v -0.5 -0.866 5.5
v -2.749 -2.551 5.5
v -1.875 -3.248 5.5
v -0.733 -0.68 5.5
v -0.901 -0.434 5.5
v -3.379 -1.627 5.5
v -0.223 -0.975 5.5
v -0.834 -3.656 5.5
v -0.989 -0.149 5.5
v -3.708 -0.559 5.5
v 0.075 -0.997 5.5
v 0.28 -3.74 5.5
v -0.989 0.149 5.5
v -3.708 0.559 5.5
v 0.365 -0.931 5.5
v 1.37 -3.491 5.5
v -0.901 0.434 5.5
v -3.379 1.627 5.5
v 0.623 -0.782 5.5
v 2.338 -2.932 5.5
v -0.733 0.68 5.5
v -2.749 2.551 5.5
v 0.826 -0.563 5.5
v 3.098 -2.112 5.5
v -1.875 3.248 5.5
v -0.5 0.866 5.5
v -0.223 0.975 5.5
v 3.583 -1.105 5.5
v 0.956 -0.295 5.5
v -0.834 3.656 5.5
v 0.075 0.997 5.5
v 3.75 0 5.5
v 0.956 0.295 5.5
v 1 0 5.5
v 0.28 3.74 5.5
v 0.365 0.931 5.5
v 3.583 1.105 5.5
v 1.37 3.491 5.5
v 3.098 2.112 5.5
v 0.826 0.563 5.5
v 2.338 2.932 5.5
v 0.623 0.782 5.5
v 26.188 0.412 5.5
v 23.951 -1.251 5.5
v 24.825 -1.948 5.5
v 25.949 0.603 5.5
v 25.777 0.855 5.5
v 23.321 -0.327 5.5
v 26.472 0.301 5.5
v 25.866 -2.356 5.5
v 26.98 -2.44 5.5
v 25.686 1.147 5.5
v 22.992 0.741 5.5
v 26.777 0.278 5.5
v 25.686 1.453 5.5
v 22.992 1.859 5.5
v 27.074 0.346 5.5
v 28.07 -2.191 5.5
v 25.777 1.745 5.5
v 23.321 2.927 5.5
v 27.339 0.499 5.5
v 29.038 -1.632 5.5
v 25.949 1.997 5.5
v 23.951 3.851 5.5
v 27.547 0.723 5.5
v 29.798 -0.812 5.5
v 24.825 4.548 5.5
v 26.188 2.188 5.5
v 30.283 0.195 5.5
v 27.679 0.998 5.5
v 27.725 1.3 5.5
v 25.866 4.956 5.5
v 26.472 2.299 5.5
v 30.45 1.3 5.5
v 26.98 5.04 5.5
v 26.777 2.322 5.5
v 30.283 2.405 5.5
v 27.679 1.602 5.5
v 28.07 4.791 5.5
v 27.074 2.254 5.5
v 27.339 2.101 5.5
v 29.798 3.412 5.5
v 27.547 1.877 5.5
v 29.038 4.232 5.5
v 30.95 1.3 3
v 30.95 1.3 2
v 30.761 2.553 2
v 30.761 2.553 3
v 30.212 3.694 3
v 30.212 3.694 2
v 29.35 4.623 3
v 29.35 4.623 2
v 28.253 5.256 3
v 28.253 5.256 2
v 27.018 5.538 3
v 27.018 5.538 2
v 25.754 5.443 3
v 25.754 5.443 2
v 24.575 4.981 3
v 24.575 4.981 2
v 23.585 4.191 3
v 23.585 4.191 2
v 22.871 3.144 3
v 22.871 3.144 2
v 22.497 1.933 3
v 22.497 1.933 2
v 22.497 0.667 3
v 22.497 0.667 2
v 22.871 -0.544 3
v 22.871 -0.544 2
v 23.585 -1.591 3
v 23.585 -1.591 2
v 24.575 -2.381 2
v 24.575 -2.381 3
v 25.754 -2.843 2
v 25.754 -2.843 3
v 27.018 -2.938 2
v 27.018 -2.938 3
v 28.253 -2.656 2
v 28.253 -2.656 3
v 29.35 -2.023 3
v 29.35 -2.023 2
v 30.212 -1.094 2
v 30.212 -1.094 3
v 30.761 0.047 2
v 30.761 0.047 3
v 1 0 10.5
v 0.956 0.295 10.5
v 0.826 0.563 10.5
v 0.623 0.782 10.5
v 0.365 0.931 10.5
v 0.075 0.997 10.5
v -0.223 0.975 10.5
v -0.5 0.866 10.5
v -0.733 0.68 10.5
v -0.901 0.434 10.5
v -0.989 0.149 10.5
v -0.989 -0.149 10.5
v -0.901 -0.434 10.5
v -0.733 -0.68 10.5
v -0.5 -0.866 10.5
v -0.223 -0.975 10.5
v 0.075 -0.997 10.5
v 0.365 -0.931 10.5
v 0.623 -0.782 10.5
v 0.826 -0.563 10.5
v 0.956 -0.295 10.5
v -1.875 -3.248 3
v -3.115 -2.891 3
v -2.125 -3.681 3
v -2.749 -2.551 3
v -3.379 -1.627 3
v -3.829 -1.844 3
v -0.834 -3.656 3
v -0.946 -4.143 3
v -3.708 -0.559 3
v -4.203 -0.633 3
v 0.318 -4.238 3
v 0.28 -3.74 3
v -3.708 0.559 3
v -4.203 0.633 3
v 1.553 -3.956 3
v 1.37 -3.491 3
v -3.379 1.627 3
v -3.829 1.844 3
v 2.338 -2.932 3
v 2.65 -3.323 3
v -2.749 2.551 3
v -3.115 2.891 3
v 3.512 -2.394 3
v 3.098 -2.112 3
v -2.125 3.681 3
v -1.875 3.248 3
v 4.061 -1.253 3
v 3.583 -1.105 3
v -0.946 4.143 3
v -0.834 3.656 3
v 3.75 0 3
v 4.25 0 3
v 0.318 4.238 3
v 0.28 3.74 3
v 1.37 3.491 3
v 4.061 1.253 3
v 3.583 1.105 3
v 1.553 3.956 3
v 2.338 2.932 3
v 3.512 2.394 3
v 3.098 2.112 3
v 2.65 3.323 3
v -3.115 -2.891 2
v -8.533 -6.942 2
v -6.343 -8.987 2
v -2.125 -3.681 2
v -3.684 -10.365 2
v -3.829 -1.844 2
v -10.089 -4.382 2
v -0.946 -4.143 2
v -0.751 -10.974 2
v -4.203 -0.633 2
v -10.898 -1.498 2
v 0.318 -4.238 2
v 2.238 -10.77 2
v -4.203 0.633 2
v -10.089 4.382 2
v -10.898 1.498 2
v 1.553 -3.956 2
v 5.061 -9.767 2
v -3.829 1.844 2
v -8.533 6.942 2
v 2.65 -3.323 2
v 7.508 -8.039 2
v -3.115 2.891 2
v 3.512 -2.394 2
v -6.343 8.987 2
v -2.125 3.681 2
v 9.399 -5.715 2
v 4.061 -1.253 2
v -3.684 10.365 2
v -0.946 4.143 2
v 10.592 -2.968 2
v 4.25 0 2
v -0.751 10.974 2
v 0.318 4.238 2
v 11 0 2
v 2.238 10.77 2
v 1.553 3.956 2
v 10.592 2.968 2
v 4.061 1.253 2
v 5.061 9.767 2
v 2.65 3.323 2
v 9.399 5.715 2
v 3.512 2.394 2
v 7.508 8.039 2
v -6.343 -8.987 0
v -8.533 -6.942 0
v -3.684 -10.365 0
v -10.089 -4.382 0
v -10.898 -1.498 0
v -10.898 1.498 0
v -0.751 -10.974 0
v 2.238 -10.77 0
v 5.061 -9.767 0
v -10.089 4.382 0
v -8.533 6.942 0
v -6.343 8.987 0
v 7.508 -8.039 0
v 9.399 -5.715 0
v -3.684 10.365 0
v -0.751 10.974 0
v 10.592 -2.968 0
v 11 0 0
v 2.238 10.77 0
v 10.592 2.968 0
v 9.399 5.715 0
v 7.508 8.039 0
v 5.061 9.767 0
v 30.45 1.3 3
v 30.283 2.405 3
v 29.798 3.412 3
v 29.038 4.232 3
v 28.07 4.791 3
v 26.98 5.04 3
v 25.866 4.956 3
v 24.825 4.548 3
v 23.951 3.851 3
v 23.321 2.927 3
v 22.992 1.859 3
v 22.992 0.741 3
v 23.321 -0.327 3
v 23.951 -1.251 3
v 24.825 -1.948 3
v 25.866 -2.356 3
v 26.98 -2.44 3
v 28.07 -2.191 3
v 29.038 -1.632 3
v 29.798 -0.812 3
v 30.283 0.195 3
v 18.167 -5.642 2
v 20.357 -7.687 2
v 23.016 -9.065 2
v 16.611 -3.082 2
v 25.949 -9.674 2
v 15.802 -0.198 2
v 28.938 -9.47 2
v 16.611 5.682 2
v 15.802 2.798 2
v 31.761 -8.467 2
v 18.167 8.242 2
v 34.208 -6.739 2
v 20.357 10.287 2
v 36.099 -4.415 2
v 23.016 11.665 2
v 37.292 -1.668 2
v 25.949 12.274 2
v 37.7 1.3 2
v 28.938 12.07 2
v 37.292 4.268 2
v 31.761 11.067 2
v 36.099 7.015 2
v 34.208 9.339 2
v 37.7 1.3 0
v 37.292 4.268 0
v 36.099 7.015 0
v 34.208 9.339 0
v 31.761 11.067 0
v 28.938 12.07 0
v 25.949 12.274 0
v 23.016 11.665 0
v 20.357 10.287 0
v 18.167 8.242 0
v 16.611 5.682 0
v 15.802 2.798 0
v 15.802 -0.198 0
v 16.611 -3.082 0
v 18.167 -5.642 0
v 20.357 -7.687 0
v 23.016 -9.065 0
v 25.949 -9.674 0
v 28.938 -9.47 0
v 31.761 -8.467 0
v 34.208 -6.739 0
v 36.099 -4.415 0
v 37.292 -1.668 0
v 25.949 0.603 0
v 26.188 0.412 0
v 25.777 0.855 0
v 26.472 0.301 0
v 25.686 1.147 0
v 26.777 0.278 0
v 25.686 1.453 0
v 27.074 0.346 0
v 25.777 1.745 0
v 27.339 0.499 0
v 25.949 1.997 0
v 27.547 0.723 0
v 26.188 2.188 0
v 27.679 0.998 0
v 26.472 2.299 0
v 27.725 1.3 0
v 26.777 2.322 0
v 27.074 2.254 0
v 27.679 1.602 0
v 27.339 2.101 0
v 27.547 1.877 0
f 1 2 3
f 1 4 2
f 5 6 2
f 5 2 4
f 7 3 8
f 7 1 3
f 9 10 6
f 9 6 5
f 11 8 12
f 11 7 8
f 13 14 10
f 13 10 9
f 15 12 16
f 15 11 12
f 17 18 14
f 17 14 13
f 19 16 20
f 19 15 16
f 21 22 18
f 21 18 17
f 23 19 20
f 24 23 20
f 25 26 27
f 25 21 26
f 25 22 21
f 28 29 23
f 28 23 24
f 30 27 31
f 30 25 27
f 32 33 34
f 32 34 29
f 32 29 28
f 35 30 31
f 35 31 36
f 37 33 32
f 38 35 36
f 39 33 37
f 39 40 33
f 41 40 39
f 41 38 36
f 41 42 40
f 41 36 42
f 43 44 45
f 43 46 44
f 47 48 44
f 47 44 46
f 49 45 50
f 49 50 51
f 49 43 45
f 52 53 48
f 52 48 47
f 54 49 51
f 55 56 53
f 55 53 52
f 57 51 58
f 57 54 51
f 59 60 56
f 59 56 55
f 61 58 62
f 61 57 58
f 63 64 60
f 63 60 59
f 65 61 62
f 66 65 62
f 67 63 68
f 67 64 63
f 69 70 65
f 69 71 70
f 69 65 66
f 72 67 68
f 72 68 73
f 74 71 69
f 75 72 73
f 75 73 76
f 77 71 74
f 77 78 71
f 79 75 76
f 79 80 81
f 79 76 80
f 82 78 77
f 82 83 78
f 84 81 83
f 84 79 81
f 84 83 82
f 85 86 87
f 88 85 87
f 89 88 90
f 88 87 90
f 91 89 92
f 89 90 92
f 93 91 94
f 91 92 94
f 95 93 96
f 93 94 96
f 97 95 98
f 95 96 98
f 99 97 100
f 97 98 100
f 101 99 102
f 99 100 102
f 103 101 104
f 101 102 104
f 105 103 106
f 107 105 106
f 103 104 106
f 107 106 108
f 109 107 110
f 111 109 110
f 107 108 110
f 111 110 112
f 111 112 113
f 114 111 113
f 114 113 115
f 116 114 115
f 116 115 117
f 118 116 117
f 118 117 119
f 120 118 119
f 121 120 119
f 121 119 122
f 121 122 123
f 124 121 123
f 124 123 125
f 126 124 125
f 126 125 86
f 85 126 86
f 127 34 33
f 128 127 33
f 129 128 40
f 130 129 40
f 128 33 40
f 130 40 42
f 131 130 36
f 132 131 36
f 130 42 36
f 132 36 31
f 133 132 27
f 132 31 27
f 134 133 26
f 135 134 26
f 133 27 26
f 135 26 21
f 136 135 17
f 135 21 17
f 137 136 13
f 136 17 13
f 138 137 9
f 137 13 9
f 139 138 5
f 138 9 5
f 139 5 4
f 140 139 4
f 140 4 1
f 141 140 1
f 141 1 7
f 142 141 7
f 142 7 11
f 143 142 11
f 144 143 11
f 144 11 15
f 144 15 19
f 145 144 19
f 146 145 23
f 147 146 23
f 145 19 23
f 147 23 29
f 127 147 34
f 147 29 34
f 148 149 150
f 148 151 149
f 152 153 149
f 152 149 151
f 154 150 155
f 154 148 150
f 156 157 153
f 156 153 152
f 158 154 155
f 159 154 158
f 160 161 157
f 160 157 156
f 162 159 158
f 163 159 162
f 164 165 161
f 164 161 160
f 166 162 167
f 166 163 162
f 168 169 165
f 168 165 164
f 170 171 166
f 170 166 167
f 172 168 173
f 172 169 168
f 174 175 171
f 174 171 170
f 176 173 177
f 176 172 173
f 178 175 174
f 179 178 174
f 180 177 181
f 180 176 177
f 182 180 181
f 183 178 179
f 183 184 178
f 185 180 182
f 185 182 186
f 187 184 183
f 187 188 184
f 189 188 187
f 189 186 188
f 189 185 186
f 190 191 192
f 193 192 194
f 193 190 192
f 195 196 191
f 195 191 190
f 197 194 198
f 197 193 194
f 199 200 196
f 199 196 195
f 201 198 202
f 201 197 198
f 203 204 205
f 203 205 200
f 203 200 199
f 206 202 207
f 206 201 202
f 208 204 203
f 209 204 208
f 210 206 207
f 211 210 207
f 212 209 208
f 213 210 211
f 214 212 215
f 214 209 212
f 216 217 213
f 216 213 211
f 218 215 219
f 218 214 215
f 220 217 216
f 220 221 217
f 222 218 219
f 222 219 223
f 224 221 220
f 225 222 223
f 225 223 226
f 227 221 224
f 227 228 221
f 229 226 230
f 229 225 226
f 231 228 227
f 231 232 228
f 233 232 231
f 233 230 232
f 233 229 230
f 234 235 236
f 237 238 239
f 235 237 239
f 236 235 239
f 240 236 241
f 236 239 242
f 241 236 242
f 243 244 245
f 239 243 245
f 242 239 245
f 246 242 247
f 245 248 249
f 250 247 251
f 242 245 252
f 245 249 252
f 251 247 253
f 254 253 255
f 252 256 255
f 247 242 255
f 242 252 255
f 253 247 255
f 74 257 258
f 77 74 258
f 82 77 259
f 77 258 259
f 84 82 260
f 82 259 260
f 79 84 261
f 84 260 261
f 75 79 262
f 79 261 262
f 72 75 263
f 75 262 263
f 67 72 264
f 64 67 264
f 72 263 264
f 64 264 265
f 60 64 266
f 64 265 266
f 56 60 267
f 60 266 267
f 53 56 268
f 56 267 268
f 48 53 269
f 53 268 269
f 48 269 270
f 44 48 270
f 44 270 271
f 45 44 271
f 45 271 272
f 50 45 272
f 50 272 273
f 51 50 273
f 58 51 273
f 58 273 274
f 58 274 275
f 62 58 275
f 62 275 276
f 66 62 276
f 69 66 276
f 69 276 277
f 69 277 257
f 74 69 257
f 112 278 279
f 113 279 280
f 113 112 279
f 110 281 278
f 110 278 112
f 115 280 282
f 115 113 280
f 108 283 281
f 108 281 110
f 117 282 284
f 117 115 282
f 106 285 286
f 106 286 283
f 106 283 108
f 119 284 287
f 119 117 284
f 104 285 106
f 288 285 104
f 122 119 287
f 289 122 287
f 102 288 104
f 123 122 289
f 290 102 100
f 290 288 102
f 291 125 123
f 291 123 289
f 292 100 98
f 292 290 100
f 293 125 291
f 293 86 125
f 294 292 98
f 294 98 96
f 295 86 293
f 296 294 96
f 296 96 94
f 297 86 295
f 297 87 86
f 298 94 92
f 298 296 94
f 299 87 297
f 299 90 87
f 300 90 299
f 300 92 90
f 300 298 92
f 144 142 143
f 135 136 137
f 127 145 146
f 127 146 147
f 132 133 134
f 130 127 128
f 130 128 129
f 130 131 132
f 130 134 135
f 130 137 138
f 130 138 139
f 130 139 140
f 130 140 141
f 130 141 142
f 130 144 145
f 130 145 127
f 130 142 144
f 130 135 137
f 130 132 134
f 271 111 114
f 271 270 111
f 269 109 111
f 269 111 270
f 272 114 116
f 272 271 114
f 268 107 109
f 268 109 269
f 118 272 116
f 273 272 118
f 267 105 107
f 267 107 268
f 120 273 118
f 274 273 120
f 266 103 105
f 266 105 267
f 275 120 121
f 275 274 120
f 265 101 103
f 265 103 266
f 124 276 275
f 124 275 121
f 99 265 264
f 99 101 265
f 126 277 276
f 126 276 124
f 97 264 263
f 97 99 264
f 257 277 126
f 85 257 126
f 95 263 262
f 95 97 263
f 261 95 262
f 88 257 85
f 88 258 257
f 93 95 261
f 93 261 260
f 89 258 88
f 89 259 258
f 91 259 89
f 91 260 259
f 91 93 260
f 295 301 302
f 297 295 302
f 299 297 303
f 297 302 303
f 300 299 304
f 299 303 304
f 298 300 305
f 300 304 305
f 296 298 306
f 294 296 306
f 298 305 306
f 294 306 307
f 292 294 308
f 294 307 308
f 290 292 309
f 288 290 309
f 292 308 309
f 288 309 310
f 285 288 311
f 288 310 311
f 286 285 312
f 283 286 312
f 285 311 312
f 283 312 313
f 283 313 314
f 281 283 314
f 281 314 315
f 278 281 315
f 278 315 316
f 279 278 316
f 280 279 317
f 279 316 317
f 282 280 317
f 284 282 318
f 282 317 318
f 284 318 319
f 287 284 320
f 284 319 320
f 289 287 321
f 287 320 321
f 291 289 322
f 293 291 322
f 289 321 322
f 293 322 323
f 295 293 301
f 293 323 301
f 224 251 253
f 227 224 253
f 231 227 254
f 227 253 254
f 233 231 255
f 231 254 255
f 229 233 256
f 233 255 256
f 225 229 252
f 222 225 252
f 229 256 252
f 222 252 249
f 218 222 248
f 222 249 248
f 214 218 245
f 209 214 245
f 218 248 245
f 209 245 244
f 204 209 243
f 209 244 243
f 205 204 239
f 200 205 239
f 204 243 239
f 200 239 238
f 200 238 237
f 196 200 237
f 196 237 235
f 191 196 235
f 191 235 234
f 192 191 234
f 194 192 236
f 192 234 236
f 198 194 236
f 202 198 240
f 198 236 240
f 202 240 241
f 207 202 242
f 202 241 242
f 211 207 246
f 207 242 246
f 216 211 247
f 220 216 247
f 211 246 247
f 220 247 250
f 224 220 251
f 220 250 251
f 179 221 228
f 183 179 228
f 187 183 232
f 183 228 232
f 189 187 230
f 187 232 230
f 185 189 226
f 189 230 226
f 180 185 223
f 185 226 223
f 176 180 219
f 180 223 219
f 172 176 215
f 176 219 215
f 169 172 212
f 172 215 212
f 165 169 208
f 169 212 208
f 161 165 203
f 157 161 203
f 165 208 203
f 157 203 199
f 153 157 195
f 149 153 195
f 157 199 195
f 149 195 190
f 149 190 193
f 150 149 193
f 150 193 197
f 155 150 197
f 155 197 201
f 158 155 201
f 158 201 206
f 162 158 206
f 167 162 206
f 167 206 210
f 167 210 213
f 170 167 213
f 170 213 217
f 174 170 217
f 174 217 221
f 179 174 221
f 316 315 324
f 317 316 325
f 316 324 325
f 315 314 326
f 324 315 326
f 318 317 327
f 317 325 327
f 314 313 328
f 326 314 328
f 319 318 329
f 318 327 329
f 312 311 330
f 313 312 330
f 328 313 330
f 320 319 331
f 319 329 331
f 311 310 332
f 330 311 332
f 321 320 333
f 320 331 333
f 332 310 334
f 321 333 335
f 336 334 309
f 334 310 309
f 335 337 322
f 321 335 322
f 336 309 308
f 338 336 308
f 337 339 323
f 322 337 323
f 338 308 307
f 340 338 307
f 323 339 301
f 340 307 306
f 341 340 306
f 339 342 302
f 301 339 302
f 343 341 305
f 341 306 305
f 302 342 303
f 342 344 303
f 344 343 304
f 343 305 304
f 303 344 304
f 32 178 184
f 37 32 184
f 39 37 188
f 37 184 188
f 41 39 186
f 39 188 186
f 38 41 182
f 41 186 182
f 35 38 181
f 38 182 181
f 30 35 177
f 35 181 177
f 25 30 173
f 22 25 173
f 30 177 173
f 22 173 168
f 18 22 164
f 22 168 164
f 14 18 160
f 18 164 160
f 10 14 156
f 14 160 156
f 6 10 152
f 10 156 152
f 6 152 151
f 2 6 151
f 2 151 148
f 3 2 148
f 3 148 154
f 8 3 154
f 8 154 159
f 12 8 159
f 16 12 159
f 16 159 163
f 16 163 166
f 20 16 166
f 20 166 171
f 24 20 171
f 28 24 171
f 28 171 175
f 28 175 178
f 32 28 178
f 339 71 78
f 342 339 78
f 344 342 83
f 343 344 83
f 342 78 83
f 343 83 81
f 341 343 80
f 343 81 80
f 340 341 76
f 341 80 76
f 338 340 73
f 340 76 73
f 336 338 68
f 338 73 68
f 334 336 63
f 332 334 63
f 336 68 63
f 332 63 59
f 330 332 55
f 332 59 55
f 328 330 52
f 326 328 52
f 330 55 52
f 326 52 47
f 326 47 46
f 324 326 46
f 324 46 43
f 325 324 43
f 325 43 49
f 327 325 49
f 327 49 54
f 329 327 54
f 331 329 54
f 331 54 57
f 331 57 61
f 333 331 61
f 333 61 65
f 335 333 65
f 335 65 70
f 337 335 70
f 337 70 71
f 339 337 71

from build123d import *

# Parameters (mm, degrees)
F0_R     = 3.75
F1_DEPTH = 5.5
F0_R_2   = 4.25
F2_DEPTH = 3
F0_R_3   = 11
F3_DEPTH = 2
F5_R     = 1
F6_DEPTH = 5
F7_R     = 1.025
F8_DEPTH = 7.7


with BuildPart() as f1:
    # F0 (on Top) → F1 (new body)
    with BuildSketch(Plane.XY):
        Circle(F0_R)
    extrude(amount=F1_DEPTH)

    # F0 (on Top) → F2 (join)
    with BuildSketch(Plane.XY):
        Circle(F0_R_2)
        Circle(F0_R, mode=Mode.SUBTRACT)
    extrude(amount=F2_DEPTH)

    # F0 (on Top) → F3 (join)
    with BuildSketch(Plane.XY):
        Circle(F0_R_3)
        Circle(F0_R_2, mode=Mode.SUBTRACT)
    extrude(amount=F3_DEPTH)


with BuildPart() as f4_1:
    # F4: copy of F1
    add(f1.part.moved(Location((26.7, 1.3, 0))))

    # F7 (on face) → F8 (cut)
    with BuildSketch(Plane.XY.offset(5.5)):
        with Locations((26.7, 1.3)):
            Circle(F7_R)
    extrude(amount=-F8_DEPTH, mode=Mode.SUBTRACT)


with BuildPart() as f1_1:
    add(f1.part)

    # F5 (on face) → F6 (join)
    with BuildSketch(Plane.XY.offset(5.5)):
        Circle(F5_R)
    extrude(amount=F6_DEPTH)


solid = Compound([f4_1.part, f1_1.part])
